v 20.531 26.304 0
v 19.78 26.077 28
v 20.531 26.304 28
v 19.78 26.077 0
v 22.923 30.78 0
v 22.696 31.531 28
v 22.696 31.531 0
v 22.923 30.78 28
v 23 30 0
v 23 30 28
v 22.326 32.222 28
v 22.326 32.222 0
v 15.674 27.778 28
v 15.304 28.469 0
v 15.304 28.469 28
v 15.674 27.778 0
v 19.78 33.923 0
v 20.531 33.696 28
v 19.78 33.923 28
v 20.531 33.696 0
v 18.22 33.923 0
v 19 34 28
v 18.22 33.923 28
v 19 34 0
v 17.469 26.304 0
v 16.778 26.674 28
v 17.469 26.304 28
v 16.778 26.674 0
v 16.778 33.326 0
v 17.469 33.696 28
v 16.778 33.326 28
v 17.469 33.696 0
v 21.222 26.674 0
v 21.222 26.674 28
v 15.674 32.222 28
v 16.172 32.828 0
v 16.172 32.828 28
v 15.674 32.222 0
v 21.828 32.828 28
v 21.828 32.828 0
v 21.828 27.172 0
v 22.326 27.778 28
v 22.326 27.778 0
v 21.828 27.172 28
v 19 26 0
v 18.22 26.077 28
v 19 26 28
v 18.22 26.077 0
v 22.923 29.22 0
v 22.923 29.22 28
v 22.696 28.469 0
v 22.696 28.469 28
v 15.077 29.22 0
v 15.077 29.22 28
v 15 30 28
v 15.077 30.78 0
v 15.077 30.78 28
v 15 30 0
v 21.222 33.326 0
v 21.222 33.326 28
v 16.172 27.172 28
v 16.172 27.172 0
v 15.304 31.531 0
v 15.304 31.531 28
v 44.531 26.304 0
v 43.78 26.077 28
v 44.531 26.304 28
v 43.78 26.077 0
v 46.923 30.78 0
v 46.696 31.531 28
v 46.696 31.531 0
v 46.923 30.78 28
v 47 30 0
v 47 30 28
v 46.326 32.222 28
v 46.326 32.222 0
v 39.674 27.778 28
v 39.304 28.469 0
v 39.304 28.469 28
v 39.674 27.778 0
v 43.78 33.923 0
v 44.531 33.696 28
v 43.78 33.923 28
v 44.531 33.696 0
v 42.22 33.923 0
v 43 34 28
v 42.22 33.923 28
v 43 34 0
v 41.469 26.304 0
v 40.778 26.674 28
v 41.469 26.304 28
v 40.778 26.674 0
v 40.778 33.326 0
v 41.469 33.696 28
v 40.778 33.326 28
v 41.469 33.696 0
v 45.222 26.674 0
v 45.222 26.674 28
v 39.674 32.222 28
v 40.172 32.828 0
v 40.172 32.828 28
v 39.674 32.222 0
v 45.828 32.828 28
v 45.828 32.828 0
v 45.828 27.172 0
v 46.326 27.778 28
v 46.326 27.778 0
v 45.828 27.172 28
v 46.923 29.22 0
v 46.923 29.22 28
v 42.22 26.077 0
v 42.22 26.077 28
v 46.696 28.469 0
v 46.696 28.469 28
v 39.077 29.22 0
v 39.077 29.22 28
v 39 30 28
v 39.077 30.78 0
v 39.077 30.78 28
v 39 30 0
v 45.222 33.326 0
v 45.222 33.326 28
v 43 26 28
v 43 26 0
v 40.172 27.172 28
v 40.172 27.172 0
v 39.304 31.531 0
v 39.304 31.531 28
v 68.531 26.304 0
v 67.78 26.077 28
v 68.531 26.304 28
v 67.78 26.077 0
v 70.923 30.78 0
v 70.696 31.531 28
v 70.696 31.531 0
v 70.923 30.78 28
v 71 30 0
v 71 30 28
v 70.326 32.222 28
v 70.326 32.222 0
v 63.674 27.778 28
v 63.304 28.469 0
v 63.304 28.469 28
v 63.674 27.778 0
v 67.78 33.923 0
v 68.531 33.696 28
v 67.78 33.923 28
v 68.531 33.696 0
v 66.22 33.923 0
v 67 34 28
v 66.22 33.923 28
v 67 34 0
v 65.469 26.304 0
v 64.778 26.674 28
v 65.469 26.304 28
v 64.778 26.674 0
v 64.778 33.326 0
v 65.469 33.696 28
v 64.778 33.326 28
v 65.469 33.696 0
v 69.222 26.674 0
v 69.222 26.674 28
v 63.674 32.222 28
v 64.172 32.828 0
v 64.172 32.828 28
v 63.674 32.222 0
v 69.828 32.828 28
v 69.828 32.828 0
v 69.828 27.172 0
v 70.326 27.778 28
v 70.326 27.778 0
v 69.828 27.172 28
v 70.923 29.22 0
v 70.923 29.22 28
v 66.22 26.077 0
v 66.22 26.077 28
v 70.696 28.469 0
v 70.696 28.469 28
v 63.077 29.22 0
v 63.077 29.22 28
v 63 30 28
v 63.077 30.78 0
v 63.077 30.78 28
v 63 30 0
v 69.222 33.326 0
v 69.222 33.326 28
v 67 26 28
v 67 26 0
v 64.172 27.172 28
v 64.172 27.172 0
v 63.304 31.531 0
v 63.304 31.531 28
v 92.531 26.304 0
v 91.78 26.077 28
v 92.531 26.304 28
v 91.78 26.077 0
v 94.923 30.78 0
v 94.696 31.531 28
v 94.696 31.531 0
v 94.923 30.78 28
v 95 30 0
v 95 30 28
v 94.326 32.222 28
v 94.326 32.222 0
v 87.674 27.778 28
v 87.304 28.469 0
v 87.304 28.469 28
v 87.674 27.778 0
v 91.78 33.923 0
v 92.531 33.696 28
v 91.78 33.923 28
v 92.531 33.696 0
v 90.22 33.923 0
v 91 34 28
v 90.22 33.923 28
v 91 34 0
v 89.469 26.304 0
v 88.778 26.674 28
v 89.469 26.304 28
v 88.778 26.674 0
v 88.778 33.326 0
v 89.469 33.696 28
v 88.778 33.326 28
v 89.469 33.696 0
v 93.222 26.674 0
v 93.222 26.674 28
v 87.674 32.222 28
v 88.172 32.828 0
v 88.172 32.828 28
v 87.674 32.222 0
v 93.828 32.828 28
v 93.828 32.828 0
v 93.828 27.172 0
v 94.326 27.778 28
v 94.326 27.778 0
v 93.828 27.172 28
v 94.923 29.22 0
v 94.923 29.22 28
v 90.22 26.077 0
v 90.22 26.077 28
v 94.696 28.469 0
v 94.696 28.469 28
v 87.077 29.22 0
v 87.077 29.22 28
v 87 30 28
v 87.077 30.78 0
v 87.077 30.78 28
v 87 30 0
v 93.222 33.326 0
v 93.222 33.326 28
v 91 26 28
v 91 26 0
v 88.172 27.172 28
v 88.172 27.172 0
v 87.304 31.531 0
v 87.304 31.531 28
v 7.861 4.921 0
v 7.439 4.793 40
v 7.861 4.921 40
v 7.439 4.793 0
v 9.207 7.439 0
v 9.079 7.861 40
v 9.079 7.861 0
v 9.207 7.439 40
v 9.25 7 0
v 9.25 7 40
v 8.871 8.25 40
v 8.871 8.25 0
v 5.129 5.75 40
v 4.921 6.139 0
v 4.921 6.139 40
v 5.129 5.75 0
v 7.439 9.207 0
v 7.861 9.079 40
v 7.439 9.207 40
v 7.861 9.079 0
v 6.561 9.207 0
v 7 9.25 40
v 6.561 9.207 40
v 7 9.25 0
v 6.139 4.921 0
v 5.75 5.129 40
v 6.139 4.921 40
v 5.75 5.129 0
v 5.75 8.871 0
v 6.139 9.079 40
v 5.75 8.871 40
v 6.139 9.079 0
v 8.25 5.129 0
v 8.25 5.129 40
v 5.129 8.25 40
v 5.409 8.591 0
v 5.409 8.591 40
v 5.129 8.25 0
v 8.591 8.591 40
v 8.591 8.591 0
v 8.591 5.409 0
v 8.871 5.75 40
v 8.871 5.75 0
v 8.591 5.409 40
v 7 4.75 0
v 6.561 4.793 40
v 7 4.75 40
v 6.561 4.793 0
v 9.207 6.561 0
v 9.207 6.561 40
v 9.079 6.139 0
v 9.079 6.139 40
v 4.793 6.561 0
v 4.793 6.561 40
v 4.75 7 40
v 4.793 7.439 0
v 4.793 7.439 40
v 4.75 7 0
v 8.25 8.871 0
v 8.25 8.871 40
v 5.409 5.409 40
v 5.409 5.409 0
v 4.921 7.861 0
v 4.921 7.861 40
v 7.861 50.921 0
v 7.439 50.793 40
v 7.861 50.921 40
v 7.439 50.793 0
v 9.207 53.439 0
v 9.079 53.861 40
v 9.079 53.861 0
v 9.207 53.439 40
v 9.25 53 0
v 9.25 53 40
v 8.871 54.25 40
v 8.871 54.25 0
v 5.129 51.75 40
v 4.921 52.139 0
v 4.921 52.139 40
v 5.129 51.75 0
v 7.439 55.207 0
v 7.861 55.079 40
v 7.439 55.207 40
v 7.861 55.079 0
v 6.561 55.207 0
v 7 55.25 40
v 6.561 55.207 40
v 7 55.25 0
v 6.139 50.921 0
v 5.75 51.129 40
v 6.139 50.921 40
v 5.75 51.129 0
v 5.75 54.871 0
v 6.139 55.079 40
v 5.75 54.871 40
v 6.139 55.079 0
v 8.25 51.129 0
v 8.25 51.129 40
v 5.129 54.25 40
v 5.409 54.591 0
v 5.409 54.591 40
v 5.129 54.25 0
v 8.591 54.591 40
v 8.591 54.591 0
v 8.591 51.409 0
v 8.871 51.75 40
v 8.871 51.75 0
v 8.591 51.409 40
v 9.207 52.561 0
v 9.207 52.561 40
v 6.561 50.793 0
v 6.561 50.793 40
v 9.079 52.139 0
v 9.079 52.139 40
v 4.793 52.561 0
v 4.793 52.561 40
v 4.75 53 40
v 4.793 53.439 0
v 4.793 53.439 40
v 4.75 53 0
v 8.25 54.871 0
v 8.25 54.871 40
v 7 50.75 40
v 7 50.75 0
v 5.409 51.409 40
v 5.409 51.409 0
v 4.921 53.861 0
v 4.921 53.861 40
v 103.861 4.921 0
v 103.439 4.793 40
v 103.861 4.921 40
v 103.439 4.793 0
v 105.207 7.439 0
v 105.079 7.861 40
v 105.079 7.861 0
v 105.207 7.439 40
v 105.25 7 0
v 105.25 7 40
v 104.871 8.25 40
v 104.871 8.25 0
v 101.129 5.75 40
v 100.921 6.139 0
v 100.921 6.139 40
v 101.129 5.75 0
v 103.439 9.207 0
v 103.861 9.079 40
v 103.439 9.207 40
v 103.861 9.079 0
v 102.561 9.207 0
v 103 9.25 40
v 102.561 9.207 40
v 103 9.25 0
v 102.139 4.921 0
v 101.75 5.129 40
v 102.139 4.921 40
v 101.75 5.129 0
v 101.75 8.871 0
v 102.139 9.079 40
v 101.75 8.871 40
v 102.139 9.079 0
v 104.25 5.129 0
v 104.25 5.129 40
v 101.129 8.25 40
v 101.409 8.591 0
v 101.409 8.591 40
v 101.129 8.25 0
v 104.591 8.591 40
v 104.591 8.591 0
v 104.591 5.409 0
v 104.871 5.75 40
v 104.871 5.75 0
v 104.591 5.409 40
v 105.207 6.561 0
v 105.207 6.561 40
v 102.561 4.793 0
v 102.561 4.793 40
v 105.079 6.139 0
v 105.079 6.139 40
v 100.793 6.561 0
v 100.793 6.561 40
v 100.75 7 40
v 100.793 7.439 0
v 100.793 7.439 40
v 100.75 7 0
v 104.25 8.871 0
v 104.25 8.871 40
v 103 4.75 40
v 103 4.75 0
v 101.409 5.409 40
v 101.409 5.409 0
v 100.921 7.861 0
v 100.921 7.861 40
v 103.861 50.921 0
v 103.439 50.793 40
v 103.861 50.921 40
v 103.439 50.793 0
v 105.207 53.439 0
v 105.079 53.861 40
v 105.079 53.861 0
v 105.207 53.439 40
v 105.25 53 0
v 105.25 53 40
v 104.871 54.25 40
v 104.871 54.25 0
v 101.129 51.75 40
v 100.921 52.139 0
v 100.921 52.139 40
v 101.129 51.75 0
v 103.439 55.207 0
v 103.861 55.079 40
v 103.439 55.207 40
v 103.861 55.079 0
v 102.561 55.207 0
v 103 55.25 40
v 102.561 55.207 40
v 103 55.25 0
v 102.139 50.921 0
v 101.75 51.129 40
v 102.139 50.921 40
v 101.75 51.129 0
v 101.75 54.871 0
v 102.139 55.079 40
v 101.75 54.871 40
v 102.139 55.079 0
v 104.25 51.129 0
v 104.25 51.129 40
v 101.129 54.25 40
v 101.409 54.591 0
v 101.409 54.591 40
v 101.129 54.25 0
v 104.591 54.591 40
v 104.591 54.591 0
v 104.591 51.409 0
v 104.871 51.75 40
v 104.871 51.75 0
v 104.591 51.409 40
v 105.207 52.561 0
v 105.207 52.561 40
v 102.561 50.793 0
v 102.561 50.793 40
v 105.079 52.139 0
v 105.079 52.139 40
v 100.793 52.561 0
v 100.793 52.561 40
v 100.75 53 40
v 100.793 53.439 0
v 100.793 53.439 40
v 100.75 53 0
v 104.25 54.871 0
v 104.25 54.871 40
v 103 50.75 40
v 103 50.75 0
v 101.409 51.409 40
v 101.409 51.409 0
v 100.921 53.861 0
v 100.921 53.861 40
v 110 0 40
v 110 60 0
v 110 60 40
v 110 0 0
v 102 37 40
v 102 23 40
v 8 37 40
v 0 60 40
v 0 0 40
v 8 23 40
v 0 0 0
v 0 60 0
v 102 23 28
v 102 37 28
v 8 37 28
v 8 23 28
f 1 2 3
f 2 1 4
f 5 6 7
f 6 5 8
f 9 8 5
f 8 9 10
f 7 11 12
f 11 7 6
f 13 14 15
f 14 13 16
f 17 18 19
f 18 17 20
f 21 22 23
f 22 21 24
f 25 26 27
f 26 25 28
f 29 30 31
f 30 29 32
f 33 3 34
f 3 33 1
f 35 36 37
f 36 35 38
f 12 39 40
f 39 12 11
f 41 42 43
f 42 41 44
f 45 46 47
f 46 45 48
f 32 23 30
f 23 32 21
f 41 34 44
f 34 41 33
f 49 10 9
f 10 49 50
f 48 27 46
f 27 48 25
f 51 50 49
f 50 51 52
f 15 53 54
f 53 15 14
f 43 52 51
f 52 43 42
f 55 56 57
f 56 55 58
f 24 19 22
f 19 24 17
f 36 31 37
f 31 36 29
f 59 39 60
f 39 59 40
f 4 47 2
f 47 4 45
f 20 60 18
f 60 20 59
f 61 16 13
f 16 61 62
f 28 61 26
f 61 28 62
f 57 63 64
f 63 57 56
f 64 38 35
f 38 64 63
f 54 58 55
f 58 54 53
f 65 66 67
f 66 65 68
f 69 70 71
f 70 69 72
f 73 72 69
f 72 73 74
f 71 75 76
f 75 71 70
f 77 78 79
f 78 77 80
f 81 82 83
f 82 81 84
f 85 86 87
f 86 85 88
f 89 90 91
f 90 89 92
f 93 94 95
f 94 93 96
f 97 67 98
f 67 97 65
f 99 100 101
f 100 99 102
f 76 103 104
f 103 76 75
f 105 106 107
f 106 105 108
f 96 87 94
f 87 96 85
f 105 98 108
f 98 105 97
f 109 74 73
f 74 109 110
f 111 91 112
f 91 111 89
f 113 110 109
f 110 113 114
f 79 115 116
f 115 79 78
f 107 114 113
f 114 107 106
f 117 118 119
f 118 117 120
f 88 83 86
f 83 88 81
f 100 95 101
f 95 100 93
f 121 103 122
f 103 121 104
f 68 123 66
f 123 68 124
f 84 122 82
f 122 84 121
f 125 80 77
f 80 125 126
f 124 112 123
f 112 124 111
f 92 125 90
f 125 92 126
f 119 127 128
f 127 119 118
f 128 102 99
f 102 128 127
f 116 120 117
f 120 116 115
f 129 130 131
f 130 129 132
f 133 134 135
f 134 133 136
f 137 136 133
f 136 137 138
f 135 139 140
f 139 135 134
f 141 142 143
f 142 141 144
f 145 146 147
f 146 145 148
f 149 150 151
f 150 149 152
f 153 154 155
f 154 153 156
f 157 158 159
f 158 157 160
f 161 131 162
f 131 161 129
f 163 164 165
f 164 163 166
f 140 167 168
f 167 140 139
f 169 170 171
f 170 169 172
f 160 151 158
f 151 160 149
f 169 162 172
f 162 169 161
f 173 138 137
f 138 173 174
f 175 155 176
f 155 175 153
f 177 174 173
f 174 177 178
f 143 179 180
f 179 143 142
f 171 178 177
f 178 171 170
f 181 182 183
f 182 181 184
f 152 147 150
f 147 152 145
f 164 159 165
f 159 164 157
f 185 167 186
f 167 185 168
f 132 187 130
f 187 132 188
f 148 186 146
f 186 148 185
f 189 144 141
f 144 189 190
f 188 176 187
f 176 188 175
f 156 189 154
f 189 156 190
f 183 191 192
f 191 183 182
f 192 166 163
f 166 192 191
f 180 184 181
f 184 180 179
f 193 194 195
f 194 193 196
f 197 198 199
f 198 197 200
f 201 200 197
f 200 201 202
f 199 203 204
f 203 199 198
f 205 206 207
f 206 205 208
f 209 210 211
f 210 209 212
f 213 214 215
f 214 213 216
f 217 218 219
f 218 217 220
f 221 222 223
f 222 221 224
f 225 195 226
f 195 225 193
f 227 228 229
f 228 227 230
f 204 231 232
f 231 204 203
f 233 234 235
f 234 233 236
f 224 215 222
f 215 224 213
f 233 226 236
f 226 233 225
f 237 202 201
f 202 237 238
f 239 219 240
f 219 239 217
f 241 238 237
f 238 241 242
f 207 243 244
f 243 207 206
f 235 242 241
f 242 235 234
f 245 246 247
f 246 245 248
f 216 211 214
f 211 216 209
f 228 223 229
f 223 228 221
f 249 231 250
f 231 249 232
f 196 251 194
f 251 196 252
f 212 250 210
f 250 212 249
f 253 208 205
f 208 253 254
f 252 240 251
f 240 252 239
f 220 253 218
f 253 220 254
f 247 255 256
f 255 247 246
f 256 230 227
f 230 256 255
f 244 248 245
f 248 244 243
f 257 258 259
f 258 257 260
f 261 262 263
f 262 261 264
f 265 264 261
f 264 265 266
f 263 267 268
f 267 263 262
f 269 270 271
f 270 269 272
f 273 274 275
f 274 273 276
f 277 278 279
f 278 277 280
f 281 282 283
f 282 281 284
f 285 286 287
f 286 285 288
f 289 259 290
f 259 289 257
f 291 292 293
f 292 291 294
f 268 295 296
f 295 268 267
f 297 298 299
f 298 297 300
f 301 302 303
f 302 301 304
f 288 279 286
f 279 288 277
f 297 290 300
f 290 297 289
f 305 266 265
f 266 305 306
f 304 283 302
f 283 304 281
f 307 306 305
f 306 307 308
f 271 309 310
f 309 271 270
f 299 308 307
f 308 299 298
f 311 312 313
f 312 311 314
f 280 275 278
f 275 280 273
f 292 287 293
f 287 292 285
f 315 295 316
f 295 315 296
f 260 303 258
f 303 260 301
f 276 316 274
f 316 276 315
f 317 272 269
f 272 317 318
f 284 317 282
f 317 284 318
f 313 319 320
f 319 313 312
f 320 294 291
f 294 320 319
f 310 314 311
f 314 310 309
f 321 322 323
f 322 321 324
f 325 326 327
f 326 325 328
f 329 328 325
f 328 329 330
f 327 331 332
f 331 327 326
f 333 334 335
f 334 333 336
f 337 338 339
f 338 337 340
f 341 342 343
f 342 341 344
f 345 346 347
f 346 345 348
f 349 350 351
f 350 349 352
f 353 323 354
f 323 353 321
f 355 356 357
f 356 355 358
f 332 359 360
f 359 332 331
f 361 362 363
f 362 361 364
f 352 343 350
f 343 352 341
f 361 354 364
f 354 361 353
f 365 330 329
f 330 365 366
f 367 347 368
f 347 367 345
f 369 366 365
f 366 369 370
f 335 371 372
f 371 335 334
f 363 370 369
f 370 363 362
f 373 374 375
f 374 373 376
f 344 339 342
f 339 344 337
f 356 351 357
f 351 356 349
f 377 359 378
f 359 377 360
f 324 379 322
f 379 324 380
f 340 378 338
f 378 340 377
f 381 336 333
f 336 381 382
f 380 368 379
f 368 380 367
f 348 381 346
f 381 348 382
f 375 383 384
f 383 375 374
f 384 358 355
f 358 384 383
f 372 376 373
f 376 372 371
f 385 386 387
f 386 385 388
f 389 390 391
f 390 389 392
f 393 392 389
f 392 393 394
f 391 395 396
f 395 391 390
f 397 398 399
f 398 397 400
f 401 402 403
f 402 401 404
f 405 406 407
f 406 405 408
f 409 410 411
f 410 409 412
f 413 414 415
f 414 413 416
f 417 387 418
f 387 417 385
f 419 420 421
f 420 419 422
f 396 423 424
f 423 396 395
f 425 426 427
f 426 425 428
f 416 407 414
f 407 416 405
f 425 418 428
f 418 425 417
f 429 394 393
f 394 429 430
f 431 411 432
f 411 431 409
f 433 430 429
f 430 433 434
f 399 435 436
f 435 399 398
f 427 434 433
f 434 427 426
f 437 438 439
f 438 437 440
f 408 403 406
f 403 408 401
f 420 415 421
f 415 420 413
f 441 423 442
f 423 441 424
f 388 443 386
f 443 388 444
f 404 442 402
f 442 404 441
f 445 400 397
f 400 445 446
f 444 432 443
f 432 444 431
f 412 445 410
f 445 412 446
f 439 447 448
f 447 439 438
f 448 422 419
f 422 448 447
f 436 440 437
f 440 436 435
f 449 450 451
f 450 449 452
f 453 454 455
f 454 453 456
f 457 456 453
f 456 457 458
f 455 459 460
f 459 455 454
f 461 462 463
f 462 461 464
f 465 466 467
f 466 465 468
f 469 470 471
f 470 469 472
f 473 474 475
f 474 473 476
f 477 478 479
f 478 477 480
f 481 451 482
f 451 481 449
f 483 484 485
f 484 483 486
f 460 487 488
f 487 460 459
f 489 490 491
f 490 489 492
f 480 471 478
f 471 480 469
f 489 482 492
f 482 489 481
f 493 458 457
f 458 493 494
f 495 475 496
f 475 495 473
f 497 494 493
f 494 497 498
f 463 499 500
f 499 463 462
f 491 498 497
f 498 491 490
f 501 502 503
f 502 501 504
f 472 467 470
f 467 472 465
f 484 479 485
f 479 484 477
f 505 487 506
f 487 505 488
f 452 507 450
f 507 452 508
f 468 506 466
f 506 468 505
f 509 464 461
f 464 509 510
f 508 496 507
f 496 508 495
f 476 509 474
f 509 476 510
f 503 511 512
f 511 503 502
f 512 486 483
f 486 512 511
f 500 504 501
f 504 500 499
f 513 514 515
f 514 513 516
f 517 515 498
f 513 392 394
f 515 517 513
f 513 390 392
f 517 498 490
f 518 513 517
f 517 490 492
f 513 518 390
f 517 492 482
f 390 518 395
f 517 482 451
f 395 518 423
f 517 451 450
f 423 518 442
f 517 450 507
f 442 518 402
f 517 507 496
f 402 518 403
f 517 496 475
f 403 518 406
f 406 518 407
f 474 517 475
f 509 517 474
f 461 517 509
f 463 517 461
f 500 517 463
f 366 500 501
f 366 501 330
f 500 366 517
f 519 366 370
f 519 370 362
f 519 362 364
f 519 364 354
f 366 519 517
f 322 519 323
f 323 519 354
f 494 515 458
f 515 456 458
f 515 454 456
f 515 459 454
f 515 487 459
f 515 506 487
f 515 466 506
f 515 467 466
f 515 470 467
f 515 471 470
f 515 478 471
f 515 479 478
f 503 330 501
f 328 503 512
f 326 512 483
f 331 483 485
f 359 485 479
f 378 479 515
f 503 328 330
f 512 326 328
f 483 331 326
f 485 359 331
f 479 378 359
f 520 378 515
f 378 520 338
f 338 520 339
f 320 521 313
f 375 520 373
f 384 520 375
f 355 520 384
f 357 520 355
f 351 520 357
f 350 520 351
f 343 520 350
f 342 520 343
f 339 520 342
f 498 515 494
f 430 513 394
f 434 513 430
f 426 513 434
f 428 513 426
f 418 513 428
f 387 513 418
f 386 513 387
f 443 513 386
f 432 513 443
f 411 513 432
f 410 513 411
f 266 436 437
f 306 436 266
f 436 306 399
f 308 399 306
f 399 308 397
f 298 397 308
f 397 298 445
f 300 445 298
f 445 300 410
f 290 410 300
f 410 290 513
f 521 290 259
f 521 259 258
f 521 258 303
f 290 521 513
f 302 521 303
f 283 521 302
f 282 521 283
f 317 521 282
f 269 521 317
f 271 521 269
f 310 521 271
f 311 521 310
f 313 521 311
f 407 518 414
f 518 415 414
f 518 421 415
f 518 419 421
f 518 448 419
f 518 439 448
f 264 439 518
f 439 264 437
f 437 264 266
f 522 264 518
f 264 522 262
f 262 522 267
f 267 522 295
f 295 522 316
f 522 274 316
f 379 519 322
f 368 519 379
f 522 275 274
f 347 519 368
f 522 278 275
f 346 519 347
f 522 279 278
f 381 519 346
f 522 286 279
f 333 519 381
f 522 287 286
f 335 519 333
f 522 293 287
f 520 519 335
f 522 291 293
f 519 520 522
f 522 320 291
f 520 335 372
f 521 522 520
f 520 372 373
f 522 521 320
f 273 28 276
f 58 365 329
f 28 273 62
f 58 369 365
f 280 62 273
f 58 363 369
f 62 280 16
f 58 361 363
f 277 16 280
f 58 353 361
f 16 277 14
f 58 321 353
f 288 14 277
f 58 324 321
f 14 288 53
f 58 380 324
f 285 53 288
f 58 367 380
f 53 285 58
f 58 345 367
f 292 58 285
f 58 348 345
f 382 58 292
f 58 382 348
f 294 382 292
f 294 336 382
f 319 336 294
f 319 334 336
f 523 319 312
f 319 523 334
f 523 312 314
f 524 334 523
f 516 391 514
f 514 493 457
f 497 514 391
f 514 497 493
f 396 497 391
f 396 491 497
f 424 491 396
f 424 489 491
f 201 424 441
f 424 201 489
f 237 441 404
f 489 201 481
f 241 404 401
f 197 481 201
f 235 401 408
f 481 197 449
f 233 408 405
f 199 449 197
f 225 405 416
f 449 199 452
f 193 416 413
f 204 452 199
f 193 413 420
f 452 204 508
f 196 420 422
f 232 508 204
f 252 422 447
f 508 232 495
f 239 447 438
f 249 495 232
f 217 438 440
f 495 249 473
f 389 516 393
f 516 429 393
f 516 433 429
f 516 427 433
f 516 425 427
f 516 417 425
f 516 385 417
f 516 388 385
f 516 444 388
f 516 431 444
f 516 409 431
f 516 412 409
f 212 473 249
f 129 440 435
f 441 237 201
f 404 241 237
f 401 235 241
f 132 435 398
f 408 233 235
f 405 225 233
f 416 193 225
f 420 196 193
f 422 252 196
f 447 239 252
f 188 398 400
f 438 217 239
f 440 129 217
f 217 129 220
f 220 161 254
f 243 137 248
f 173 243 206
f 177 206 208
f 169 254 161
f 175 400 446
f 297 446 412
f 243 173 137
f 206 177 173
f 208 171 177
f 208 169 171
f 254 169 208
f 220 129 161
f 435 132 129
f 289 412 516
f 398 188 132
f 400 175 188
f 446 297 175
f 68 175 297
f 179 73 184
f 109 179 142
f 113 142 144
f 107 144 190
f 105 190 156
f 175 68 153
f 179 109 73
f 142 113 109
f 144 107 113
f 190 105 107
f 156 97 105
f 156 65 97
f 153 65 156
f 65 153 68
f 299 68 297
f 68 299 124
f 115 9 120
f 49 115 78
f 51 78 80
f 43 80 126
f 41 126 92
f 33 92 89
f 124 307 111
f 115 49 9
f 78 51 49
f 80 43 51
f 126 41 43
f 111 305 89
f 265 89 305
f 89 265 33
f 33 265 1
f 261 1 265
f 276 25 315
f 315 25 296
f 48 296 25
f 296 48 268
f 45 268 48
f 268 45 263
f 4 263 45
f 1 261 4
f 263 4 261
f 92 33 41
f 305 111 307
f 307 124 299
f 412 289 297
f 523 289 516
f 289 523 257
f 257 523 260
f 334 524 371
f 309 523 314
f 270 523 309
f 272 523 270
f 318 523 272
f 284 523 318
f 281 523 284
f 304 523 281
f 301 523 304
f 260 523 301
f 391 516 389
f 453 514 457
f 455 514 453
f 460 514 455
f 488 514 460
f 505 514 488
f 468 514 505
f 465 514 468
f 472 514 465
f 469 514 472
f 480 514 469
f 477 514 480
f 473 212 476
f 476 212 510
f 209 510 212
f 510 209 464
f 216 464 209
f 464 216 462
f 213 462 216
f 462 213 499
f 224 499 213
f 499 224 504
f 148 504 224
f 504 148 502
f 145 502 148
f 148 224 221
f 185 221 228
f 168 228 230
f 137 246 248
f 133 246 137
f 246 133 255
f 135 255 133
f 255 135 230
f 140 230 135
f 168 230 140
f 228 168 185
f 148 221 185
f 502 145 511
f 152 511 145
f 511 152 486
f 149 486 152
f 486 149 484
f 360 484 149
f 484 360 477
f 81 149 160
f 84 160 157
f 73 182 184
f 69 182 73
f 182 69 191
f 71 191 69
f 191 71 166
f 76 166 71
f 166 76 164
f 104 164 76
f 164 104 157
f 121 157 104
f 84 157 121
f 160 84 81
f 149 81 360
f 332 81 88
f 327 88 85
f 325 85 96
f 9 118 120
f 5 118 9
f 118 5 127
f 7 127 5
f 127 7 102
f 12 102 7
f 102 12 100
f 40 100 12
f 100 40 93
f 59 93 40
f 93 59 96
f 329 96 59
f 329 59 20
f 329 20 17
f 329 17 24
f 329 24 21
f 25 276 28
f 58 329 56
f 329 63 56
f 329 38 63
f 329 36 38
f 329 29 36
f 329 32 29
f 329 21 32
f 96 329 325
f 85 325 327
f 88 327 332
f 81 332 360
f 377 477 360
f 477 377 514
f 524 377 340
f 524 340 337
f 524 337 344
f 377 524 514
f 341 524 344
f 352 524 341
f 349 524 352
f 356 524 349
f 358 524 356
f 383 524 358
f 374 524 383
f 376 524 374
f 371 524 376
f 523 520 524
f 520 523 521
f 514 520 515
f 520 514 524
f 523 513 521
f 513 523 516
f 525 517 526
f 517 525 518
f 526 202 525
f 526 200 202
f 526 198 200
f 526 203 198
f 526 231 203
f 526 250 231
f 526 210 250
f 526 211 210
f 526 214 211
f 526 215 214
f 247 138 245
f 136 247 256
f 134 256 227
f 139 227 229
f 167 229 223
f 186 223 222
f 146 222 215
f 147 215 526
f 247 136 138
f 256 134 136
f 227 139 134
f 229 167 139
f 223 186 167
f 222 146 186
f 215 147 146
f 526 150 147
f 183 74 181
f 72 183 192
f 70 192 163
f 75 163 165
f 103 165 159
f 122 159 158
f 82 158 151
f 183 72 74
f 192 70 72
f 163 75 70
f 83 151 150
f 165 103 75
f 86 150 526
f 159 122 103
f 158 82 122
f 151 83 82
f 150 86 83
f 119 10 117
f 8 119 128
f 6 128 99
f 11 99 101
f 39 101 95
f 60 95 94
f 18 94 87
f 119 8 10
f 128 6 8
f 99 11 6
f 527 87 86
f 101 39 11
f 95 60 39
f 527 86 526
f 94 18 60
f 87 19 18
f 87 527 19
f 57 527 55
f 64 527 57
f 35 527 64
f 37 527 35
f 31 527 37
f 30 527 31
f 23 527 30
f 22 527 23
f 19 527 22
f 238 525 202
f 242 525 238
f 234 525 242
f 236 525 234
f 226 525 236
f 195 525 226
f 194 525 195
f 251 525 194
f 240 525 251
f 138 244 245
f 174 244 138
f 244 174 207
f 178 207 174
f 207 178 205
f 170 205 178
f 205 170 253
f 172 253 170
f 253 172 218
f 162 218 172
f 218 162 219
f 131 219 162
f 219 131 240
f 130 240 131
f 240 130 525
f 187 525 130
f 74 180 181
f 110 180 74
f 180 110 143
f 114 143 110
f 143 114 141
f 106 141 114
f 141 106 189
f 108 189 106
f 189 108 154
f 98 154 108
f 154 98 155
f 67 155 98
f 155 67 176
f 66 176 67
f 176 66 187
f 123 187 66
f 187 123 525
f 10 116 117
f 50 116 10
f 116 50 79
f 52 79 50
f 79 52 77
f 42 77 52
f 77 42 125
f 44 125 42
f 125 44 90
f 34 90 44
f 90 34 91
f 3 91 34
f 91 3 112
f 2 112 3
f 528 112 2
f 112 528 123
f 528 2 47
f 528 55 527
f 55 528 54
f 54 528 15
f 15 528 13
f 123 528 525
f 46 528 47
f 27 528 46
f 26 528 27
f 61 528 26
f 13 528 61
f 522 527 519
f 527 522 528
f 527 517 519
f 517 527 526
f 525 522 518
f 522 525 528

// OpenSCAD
$fn = 32;

// ----------------------------------------------------------------------
// Manifold block: gallery_top manifold
// ----------------------------------------------------------------------

// --- parameters (mm) ---
block_l = 110;            // block length, X
block_w = 60;             // block width, Y
block_h = 40;             // block height, Z
port_d = 8;               // port bore diameter
port_pitch = 24;          // port pitch along X
gallery_d = 14;           // top gallery width, Y
gallery_depth = 12;       // gallery pocket depth
wall_p = 8;               // gallery end wall thickness, X
mnt_d = 4.5;              // mounting hole diameter
mnt_in = 7;               // mounting hole inset from the edges
fit_tol = 0.05;           // tolerance for press fits, mm
free_tol = 0.3;           // tolerance for clearance fits, mm

n_ports = 4;  // ports in the row
port_x0 = (block_l - (n_ports - 1) * port_pitch) / 2;  // first port X

difference() {
  cube([block_l, block_w, block_h]);
  for (i = [0 : n_ports - 1])
    translate([port_x0 + i * port_pitch, block_w / 2, -1])
      cylinder(h = block_h + 2, d = port_d);
  translate([wall_p, block_w / 2 - gallery_d / 2, block_h - gallery_depth])
    cube([block_l - 2 * wall_p, gallery_d, gallery_depth + 1]);
  for (cx = [mnt_in, block_l - mnt_in])
    for (cy = [mnt_in, block_w - mnt_in])
      translate([cx, cy, -1]) cylinder(h = block_h + 2, d = mnt_d);
}
